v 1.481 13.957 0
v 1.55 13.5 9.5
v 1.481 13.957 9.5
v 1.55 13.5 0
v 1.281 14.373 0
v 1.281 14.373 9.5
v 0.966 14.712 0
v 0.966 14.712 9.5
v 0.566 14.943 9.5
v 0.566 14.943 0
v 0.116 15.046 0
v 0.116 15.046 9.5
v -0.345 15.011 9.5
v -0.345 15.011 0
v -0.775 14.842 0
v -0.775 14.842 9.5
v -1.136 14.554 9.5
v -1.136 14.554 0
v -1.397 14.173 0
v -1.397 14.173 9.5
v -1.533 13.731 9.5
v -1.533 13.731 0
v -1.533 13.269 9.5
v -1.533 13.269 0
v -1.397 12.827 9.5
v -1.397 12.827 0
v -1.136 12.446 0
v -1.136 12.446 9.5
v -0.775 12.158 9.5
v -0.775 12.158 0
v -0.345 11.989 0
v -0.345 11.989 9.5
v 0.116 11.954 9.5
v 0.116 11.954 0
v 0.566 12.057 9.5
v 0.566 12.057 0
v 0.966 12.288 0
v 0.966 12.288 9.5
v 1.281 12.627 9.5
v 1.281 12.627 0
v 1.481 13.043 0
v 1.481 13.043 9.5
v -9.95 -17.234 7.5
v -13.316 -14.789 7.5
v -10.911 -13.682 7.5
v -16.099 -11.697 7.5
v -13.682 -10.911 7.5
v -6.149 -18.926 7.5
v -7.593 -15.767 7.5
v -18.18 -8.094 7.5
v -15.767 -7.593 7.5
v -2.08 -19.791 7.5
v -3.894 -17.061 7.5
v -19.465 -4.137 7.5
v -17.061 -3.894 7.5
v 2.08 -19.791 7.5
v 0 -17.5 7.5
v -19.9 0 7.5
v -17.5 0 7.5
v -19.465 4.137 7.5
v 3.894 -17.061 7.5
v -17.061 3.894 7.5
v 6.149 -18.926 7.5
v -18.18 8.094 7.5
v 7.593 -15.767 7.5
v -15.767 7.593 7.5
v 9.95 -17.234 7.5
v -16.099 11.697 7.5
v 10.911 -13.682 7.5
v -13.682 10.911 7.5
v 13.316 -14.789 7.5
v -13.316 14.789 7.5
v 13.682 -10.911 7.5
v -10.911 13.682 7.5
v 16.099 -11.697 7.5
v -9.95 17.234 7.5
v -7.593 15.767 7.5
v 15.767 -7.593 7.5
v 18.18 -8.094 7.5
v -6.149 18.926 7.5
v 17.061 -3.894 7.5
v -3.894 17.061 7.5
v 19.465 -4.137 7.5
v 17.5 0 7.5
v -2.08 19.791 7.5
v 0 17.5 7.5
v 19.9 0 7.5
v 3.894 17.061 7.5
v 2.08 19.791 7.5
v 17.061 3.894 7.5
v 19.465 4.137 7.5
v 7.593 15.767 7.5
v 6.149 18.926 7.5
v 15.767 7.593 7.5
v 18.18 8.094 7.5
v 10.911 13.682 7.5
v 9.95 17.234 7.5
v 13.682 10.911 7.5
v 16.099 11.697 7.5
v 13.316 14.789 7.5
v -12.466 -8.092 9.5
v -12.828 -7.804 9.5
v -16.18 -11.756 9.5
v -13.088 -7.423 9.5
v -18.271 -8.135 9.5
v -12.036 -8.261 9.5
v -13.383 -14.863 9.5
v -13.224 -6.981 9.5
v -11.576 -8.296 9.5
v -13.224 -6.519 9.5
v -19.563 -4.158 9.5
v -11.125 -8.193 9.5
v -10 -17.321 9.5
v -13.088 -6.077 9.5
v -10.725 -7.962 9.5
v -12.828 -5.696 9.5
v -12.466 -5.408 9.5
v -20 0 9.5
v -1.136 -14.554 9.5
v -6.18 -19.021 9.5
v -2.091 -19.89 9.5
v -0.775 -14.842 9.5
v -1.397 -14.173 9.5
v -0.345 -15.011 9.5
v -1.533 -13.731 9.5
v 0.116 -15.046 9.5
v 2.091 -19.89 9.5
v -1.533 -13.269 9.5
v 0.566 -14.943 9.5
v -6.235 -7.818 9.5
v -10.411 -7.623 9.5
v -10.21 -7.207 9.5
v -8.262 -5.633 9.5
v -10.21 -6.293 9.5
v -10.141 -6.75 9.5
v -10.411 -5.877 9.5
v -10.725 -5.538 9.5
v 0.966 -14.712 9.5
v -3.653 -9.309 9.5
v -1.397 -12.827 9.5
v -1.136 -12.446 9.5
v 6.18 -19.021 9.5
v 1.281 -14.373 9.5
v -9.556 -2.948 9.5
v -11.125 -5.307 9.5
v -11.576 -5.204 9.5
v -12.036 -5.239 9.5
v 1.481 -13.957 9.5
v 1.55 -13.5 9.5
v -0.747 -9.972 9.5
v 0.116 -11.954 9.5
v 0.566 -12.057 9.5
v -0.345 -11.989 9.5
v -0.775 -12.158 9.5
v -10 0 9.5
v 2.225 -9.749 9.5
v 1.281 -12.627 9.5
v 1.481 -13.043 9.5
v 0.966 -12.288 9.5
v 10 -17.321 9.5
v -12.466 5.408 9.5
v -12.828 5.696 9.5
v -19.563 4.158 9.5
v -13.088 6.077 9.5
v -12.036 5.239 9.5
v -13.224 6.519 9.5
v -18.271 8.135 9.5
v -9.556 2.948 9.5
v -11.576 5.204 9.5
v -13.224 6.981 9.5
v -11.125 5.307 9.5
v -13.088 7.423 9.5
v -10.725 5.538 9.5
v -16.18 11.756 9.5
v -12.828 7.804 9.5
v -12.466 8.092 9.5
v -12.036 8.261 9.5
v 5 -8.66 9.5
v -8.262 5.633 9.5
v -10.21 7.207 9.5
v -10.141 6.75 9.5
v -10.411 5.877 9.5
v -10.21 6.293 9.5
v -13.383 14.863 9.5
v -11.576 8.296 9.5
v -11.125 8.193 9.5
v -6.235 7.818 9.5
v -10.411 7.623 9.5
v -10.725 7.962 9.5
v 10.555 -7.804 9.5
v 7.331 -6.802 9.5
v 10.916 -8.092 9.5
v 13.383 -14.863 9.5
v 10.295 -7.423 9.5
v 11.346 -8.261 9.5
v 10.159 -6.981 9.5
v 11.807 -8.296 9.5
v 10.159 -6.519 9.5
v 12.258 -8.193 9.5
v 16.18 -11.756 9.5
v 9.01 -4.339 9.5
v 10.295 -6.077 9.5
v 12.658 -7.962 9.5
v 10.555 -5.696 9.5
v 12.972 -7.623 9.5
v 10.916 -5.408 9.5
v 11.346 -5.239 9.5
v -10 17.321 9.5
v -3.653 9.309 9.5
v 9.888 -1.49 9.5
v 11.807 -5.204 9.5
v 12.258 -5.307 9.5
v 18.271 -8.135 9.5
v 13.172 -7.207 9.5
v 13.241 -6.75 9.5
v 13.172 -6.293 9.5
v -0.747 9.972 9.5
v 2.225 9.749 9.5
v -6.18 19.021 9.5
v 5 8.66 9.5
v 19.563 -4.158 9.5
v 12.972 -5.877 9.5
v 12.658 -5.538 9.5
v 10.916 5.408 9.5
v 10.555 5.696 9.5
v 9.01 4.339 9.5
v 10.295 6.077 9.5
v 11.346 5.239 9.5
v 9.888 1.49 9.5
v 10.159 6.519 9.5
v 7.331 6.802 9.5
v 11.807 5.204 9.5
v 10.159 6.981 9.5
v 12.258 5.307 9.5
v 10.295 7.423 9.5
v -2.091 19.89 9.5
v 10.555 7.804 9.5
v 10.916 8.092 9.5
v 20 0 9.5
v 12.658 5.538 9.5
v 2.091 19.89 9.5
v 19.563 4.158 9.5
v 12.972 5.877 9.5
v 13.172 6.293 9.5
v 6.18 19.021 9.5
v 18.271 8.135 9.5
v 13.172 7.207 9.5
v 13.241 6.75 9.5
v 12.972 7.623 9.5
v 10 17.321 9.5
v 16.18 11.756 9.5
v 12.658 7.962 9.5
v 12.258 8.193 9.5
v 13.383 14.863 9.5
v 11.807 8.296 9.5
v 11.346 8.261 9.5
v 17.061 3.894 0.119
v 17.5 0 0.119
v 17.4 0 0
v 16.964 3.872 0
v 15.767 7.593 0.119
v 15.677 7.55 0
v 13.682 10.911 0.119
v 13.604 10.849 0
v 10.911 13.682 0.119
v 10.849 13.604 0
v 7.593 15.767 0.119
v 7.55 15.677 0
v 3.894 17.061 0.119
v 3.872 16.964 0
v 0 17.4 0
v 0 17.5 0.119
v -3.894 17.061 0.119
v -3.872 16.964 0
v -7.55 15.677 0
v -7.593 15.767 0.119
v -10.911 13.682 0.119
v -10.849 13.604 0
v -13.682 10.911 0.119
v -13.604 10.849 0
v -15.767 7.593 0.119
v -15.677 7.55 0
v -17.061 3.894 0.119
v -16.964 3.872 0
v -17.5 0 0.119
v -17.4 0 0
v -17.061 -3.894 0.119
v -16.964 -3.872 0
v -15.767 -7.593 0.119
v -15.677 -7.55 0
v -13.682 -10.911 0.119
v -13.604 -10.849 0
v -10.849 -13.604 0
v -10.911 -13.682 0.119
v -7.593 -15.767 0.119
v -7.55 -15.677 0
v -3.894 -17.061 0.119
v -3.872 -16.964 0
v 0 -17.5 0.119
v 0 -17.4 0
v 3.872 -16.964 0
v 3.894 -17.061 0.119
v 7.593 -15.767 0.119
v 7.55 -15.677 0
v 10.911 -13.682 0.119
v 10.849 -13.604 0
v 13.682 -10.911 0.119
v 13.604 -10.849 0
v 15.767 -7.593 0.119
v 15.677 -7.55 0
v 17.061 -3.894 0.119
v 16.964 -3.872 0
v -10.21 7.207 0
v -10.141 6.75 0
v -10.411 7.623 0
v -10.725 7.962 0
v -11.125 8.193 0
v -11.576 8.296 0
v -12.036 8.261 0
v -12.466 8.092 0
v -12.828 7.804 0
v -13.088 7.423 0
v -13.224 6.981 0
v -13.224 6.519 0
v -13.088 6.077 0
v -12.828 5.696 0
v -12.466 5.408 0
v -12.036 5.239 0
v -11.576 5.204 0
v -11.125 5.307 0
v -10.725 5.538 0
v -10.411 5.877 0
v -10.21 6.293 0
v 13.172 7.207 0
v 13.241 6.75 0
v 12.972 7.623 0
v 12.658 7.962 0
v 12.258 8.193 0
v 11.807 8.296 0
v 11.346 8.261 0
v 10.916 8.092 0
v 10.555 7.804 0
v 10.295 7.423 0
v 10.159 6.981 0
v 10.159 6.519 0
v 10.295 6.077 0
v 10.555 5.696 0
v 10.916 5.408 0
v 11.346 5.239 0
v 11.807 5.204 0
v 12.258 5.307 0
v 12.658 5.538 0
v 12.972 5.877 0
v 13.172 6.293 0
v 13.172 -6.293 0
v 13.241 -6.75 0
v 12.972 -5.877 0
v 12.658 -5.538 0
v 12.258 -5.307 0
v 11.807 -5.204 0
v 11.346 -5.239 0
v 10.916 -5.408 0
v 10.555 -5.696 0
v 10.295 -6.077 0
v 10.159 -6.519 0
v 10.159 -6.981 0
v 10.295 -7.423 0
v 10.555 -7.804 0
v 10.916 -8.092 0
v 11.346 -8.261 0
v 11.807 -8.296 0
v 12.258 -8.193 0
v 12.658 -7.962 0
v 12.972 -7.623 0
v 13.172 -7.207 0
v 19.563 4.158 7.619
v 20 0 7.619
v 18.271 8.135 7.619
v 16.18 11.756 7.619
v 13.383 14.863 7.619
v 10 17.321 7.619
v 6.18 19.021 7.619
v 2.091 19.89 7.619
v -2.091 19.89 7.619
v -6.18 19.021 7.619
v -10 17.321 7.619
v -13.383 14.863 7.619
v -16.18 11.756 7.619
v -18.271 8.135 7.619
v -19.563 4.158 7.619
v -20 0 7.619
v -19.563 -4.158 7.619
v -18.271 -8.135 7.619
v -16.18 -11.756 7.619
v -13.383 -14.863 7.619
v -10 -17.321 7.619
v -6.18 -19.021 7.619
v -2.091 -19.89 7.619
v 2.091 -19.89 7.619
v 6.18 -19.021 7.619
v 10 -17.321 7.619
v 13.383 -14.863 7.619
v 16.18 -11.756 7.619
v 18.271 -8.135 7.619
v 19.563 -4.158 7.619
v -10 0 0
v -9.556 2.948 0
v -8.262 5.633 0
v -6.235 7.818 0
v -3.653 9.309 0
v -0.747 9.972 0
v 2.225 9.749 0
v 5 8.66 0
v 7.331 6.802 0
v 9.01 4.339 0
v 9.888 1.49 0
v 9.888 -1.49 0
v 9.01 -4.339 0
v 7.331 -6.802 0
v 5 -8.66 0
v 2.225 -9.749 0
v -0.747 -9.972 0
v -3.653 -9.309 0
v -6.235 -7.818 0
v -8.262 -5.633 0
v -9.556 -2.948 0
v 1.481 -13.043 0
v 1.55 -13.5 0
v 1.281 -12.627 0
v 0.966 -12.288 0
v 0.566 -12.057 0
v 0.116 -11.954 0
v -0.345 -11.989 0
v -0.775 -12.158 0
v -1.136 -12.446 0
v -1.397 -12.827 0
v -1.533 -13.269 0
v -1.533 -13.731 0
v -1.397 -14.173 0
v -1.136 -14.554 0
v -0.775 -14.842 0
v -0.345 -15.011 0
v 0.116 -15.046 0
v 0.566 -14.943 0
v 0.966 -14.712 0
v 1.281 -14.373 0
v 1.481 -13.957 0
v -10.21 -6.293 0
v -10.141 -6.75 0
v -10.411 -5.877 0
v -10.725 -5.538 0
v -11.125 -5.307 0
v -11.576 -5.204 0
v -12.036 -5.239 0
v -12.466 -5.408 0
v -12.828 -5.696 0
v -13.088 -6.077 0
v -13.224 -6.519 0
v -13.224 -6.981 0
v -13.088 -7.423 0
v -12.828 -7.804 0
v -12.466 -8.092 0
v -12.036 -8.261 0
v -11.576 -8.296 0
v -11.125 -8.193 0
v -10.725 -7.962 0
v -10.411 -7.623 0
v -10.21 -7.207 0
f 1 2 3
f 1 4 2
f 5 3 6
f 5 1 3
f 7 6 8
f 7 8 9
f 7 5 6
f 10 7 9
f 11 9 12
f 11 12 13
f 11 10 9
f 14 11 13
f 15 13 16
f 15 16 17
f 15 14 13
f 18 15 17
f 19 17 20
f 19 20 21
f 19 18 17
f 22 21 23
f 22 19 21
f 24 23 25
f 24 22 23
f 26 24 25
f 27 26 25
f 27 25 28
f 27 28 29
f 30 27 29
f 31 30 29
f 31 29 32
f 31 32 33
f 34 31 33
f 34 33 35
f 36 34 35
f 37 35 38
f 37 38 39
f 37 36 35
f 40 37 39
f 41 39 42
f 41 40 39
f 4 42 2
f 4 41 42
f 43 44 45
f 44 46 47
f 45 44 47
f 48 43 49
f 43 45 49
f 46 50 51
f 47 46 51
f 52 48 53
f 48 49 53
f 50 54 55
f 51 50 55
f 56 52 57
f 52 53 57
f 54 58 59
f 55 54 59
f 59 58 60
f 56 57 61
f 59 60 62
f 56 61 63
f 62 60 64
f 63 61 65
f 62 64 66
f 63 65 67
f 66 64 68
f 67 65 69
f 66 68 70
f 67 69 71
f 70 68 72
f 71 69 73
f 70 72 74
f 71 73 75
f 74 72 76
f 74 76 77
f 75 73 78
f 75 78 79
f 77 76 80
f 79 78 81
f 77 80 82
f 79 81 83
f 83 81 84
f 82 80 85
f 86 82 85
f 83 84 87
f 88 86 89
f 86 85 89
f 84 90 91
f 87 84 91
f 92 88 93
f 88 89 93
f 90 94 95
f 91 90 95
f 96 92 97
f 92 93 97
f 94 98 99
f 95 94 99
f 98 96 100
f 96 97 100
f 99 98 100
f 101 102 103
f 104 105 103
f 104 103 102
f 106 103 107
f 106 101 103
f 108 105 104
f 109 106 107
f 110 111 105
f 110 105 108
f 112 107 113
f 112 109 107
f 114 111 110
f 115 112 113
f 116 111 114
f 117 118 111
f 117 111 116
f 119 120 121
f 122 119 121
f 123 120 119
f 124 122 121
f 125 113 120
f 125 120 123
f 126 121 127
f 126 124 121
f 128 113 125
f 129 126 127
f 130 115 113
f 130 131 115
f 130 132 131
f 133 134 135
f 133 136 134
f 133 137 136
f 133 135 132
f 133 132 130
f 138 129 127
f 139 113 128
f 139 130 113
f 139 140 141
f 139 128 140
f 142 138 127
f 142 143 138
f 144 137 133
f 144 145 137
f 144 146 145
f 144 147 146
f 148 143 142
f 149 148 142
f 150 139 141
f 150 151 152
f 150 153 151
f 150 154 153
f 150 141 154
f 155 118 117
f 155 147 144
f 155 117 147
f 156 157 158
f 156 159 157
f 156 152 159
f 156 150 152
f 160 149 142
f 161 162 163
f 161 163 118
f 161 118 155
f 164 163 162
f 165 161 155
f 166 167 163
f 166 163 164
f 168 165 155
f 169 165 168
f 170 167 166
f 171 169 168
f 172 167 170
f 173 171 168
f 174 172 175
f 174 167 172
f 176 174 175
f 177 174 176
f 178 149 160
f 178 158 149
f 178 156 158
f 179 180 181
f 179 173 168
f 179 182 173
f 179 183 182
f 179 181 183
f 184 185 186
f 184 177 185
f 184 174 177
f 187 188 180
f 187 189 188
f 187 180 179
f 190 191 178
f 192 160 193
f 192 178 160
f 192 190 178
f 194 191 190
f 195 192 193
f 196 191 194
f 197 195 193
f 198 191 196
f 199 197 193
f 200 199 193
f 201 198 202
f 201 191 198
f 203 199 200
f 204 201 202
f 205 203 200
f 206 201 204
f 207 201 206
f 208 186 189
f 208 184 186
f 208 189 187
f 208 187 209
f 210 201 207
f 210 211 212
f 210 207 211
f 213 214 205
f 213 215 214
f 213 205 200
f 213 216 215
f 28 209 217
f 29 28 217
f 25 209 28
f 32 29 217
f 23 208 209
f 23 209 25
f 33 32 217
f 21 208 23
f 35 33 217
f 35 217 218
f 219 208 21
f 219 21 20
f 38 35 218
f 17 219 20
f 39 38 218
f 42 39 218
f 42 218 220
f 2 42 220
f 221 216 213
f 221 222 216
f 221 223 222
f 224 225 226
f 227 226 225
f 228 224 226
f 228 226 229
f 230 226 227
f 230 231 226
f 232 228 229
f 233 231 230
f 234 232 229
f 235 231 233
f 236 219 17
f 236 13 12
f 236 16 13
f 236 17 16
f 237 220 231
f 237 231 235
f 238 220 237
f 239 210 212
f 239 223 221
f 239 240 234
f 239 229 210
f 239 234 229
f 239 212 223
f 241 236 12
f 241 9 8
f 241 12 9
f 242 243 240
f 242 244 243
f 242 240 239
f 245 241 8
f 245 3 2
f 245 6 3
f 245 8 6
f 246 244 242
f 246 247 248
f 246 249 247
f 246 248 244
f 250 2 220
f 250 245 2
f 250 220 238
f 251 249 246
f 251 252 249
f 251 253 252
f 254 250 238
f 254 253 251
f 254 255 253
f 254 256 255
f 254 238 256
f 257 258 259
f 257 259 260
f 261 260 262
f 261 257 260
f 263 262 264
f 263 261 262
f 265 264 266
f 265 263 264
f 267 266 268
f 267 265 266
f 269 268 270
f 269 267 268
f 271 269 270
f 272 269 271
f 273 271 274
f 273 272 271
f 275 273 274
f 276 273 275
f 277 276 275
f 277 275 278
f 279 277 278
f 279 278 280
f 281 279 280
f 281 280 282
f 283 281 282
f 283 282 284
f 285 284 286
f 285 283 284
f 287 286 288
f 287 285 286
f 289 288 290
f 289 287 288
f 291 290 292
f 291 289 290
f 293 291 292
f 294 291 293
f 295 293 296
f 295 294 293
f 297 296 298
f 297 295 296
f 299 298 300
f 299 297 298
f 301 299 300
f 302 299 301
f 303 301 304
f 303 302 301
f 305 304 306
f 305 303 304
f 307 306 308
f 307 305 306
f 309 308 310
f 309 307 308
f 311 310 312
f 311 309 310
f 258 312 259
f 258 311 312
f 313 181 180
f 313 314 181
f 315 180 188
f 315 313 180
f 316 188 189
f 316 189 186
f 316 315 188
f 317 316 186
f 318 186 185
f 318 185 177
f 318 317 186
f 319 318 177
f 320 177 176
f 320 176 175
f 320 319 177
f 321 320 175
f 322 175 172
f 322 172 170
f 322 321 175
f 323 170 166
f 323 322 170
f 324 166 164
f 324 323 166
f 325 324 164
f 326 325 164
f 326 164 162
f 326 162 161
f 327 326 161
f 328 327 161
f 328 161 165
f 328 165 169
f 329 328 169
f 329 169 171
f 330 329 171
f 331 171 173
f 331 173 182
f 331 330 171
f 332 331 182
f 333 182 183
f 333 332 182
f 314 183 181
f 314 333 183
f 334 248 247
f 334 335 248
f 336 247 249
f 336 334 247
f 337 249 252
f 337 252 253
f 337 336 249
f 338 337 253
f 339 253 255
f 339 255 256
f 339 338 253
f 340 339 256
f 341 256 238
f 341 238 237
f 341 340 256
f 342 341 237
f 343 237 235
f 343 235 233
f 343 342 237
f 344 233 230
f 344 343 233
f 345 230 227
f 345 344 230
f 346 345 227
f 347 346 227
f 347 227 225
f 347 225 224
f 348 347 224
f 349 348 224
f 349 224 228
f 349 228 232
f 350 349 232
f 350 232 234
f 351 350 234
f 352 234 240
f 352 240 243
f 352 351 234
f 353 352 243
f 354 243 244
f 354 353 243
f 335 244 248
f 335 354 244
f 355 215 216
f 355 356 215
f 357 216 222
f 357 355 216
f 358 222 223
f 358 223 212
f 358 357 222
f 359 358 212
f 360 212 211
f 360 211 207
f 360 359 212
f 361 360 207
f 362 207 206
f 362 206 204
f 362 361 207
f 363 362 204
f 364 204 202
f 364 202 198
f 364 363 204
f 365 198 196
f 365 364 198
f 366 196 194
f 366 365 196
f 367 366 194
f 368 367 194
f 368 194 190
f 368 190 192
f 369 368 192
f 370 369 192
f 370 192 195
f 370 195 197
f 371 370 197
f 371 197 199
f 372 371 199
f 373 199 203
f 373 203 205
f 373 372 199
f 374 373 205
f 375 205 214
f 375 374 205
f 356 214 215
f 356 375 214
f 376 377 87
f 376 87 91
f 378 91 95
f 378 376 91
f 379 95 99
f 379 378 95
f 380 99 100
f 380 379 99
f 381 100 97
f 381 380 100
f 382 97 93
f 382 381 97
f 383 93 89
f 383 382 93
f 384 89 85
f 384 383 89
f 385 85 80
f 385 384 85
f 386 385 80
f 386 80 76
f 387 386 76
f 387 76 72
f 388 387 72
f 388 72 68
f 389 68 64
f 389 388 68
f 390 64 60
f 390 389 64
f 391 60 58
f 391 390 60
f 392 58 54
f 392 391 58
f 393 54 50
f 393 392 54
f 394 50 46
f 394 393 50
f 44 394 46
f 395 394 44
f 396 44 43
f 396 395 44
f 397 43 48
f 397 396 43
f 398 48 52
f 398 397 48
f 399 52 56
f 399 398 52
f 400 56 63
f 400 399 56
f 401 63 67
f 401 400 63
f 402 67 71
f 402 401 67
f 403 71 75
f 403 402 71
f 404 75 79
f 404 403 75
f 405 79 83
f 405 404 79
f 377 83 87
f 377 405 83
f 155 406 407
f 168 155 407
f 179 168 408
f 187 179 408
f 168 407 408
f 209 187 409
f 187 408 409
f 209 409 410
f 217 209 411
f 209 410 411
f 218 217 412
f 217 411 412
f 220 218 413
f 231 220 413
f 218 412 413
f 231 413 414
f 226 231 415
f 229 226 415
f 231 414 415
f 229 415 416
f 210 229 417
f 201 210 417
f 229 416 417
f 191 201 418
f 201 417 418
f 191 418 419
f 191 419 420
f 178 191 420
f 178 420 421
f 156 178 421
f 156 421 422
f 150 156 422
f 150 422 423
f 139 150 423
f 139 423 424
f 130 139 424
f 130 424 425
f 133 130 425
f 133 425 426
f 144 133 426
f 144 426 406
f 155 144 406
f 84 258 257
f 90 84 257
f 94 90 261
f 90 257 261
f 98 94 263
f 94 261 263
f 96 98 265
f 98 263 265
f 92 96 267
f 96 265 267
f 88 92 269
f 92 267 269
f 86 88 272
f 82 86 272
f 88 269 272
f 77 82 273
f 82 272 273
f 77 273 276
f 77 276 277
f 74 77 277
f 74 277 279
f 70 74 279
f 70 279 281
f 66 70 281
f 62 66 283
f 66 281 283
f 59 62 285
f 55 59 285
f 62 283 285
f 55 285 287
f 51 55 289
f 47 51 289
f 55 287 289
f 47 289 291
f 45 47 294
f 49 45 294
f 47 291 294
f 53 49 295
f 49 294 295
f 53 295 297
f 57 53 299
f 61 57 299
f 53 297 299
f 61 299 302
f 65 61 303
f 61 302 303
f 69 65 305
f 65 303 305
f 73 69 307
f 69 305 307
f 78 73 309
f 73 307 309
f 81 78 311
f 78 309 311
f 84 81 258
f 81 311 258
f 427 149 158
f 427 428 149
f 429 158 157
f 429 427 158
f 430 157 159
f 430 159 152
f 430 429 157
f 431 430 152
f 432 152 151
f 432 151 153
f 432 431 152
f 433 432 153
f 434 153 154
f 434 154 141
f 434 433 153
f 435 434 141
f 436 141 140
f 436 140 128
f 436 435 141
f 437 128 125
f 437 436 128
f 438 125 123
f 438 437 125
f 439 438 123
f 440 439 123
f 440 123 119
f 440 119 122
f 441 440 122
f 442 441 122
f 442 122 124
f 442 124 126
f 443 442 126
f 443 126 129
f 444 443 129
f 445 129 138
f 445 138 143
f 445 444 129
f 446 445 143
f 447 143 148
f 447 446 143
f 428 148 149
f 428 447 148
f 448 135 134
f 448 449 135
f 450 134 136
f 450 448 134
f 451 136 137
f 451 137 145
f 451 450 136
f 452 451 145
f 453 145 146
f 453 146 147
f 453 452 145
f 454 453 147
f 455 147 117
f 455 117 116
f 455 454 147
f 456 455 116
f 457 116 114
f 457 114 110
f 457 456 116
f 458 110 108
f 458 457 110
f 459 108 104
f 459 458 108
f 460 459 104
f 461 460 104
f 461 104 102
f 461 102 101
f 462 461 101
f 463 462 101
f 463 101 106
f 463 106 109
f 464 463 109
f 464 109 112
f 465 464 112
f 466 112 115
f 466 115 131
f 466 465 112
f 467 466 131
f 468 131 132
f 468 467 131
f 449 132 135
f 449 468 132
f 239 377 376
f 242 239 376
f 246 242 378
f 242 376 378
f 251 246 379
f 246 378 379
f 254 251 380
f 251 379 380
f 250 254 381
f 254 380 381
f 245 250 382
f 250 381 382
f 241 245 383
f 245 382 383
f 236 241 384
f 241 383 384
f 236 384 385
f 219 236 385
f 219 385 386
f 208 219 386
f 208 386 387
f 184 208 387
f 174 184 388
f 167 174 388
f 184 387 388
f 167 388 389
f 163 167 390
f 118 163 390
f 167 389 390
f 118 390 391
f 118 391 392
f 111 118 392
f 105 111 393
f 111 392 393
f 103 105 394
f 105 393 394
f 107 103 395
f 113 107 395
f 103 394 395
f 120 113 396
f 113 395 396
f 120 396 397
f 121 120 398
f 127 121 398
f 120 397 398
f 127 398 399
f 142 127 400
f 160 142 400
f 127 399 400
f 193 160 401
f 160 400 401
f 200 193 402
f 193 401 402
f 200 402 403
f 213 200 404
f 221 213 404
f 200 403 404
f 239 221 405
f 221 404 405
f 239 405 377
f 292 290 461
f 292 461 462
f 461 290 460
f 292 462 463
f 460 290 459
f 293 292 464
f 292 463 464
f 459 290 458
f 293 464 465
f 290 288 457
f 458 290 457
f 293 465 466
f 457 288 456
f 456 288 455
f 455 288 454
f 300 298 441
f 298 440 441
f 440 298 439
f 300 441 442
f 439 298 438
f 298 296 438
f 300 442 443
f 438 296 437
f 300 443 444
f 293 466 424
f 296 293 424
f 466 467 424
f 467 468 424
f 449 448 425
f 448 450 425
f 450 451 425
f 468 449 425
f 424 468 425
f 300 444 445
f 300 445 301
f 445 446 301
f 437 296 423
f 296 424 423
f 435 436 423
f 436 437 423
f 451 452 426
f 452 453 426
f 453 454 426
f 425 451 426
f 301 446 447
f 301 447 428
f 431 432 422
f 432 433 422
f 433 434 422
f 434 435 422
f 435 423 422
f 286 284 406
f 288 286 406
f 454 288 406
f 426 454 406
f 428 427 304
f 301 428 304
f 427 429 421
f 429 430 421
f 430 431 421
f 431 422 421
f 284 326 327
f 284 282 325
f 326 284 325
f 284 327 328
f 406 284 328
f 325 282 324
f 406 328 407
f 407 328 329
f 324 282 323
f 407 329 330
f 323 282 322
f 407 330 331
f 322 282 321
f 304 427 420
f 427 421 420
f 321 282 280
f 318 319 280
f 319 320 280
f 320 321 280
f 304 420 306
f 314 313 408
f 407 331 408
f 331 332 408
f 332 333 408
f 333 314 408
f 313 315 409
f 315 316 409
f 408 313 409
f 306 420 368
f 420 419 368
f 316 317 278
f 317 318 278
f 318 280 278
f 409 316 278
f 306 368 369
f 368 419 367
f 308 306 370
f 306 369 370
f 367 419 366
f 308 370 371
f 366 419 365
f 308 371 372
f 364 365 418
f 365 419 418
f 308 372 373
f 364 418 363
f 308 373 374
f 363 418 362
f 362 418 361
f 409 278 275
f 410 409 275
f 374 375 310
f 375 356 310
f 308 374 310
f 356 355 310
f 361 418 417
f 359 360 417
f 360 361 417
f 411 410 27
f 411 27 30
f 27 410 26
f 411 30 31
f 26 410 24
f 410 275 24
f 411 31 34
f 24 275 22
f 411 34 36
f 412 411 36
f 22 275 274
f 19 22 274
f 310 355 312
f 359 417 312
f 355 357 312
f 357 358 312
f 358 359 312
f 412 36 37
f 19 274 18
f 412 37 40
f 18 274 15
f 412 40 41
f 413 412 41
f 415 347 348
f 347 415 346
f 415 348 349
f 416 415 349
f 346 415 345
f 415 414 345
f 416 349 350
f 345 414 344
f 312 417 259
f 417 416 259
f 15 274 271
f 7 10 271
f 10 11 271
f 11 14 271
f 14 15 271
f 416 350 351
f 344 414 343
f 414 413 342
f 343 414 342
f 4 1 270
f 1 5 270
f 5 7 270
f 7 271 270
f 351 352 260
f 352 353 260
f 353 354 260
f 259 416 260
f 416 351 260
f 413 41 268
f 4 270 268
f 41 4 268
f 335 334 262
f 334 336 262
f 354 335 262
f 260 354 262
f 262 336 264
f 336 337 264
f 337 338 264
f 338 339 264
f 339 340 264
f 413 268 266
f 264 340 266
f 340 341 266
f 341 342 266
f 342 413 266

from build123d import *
from OCP.BRepFilletAPI import BRepFilletAPI_MakeChamfer

# Parameters (mm, degrees)
SKETCH_1_R          = 17.5
SKETCH_1_R_2        = 1.55
EXTRUDE_1_DEPTH     = 7.5
SKETCH_2_R          = 20
SKETCH_2_R_2        = 1.55
EXTRUDE_2_DEPTH     = 2
CHAMFER_1_SIZE      = 0.1
CHAMFER_1_SIZE2     = 0.119175359
SKETCH_4_R          = 10
CUT_EXTRUDE_1_DEPTH = 25


with BuildPart() as part:
    # 草图1 → 凸台-拉伸1 (new body)
    with BuildSketch(Plane.XY):
        Circle(SKETCH_1_R)
        with Locations((0, 13.5)):
            Circle(SKETCH_1_R_2, mode=Mode.SUBTRACT)
        with Locations((11.691342951, 6.75)):
            Circle(SKETCH_1_R_2, mode=Mode.SUBTRACT)
        with Locations((11.691342951, -6.75)):
            Circle(SKETCH_1_R_2, mode=Mode.SUBTRACT)
        with Locations((0, -13.5)):
            Circle(SKETCH_1_R_2, mode=Mode.SUBTRACT)
        with Locations((-11.691342951, -6.75)):
            Circle(SKETCH_1_R_2, mode=Mode.SUBTRACT)
        with Locations((-11.691342951, 6.75)):
            Circle(SKETCH_1_R_2, mode=Mode.SUBTRACT)
    extrude(amount=EXTRUDE_1_DEPTH)

    # 草图2 → 凸台-拉伸2 (add)
    with BuildSketch(Plane.XY.offset(7.5)):
        Circle(SKETCH_2_R)
        with Locations((11.691342951, 6.75)):
            Circle(SKETCH_2_R_2, mode=Mode.SUBTRACT)
        with Locations((11.691342951, -6.75)):
            Circle(SKETCH_2_R_2, mode=Mode.SUBTRACT)
        with Locations((0, -13.5)):
            Circle(SKETCH_2_R_2, mode=Mode.SUBTRACT)
        with Locations((-11.691342951, -6.75)):
            Circle(SKETCH_2_R_2, mode=Mode.SUBTRACT)
        with Locations((-11.691342951, 6.75)):
            Circle(SKETCH_2_R_2, mode=Mode.SUBTRACT)
        with Locations((0, 13.5)):
            Circle(SKETCH_2_R_2, mode=Mode.SUBTRACT)
    extrude(amount=EXTRUDE_2_DEPTH)

    # 倒角1: one chamfer whose edges measure the first distance from different faces: ONE call of the kernel's chamfer builder (chamfer() names one face for all edges)
    chamfer_1_edges_1 = [part.edges().sort_by_distance(p)[0] for p in [
        (-17.5, 0, 0),
    ]]
    chamfer_1_side_1 = [part.faces().sort_by_distance(p)[0] for p in [
        (0, 0, 0),
    ]]
    chamfer_1_edges_2 = [part.edges().sort_by_distance(p)[0] for p in [
        (-20, 0, 7.5),
    ]]
    chamfer_1_side_2 = [part.faces().sort_by_distance(p)[0] for p in [
        (-19.434314575, 0, 7.5),
    ]]
    chamfer_1 = BRepFilletAPI_MakeChamfer(part.part.solid().wrapped)
    for e in chamfer_1_edges_1:
        chamfer_1.Add(CHAMFER_1_SIZE, CHAMFER_1_SIZE2, e.wrapped, chamfer_1_side_1[0].wrapped)  # the first distance lies on this face
    for e in chamfer_1_edges_2:
        chamfer_1.Add(CHAMFER_1_SIZE, CHAMFER_1_SIZE2, e.wrapped, chamfer_1_side_2[0].wrapped)  # the first distance lies on this face
    add(Compound.cast(chamfer_1.Shape()), mode=Mode.REPLACE)

    # 草图4 → 切除-拉伸1 (cut)
    with BuildSketch(Plane(origin=(0, 0, 0), x_dir=(-1, 0, 0), z_dir=(0, 0, -1))):
        Circle(SKETCH_4_R)
    extrude(amount=-CUT_EXTRUDE_1_DEPTH, mode=Mode.SUBTRACT)


solid = part.part
